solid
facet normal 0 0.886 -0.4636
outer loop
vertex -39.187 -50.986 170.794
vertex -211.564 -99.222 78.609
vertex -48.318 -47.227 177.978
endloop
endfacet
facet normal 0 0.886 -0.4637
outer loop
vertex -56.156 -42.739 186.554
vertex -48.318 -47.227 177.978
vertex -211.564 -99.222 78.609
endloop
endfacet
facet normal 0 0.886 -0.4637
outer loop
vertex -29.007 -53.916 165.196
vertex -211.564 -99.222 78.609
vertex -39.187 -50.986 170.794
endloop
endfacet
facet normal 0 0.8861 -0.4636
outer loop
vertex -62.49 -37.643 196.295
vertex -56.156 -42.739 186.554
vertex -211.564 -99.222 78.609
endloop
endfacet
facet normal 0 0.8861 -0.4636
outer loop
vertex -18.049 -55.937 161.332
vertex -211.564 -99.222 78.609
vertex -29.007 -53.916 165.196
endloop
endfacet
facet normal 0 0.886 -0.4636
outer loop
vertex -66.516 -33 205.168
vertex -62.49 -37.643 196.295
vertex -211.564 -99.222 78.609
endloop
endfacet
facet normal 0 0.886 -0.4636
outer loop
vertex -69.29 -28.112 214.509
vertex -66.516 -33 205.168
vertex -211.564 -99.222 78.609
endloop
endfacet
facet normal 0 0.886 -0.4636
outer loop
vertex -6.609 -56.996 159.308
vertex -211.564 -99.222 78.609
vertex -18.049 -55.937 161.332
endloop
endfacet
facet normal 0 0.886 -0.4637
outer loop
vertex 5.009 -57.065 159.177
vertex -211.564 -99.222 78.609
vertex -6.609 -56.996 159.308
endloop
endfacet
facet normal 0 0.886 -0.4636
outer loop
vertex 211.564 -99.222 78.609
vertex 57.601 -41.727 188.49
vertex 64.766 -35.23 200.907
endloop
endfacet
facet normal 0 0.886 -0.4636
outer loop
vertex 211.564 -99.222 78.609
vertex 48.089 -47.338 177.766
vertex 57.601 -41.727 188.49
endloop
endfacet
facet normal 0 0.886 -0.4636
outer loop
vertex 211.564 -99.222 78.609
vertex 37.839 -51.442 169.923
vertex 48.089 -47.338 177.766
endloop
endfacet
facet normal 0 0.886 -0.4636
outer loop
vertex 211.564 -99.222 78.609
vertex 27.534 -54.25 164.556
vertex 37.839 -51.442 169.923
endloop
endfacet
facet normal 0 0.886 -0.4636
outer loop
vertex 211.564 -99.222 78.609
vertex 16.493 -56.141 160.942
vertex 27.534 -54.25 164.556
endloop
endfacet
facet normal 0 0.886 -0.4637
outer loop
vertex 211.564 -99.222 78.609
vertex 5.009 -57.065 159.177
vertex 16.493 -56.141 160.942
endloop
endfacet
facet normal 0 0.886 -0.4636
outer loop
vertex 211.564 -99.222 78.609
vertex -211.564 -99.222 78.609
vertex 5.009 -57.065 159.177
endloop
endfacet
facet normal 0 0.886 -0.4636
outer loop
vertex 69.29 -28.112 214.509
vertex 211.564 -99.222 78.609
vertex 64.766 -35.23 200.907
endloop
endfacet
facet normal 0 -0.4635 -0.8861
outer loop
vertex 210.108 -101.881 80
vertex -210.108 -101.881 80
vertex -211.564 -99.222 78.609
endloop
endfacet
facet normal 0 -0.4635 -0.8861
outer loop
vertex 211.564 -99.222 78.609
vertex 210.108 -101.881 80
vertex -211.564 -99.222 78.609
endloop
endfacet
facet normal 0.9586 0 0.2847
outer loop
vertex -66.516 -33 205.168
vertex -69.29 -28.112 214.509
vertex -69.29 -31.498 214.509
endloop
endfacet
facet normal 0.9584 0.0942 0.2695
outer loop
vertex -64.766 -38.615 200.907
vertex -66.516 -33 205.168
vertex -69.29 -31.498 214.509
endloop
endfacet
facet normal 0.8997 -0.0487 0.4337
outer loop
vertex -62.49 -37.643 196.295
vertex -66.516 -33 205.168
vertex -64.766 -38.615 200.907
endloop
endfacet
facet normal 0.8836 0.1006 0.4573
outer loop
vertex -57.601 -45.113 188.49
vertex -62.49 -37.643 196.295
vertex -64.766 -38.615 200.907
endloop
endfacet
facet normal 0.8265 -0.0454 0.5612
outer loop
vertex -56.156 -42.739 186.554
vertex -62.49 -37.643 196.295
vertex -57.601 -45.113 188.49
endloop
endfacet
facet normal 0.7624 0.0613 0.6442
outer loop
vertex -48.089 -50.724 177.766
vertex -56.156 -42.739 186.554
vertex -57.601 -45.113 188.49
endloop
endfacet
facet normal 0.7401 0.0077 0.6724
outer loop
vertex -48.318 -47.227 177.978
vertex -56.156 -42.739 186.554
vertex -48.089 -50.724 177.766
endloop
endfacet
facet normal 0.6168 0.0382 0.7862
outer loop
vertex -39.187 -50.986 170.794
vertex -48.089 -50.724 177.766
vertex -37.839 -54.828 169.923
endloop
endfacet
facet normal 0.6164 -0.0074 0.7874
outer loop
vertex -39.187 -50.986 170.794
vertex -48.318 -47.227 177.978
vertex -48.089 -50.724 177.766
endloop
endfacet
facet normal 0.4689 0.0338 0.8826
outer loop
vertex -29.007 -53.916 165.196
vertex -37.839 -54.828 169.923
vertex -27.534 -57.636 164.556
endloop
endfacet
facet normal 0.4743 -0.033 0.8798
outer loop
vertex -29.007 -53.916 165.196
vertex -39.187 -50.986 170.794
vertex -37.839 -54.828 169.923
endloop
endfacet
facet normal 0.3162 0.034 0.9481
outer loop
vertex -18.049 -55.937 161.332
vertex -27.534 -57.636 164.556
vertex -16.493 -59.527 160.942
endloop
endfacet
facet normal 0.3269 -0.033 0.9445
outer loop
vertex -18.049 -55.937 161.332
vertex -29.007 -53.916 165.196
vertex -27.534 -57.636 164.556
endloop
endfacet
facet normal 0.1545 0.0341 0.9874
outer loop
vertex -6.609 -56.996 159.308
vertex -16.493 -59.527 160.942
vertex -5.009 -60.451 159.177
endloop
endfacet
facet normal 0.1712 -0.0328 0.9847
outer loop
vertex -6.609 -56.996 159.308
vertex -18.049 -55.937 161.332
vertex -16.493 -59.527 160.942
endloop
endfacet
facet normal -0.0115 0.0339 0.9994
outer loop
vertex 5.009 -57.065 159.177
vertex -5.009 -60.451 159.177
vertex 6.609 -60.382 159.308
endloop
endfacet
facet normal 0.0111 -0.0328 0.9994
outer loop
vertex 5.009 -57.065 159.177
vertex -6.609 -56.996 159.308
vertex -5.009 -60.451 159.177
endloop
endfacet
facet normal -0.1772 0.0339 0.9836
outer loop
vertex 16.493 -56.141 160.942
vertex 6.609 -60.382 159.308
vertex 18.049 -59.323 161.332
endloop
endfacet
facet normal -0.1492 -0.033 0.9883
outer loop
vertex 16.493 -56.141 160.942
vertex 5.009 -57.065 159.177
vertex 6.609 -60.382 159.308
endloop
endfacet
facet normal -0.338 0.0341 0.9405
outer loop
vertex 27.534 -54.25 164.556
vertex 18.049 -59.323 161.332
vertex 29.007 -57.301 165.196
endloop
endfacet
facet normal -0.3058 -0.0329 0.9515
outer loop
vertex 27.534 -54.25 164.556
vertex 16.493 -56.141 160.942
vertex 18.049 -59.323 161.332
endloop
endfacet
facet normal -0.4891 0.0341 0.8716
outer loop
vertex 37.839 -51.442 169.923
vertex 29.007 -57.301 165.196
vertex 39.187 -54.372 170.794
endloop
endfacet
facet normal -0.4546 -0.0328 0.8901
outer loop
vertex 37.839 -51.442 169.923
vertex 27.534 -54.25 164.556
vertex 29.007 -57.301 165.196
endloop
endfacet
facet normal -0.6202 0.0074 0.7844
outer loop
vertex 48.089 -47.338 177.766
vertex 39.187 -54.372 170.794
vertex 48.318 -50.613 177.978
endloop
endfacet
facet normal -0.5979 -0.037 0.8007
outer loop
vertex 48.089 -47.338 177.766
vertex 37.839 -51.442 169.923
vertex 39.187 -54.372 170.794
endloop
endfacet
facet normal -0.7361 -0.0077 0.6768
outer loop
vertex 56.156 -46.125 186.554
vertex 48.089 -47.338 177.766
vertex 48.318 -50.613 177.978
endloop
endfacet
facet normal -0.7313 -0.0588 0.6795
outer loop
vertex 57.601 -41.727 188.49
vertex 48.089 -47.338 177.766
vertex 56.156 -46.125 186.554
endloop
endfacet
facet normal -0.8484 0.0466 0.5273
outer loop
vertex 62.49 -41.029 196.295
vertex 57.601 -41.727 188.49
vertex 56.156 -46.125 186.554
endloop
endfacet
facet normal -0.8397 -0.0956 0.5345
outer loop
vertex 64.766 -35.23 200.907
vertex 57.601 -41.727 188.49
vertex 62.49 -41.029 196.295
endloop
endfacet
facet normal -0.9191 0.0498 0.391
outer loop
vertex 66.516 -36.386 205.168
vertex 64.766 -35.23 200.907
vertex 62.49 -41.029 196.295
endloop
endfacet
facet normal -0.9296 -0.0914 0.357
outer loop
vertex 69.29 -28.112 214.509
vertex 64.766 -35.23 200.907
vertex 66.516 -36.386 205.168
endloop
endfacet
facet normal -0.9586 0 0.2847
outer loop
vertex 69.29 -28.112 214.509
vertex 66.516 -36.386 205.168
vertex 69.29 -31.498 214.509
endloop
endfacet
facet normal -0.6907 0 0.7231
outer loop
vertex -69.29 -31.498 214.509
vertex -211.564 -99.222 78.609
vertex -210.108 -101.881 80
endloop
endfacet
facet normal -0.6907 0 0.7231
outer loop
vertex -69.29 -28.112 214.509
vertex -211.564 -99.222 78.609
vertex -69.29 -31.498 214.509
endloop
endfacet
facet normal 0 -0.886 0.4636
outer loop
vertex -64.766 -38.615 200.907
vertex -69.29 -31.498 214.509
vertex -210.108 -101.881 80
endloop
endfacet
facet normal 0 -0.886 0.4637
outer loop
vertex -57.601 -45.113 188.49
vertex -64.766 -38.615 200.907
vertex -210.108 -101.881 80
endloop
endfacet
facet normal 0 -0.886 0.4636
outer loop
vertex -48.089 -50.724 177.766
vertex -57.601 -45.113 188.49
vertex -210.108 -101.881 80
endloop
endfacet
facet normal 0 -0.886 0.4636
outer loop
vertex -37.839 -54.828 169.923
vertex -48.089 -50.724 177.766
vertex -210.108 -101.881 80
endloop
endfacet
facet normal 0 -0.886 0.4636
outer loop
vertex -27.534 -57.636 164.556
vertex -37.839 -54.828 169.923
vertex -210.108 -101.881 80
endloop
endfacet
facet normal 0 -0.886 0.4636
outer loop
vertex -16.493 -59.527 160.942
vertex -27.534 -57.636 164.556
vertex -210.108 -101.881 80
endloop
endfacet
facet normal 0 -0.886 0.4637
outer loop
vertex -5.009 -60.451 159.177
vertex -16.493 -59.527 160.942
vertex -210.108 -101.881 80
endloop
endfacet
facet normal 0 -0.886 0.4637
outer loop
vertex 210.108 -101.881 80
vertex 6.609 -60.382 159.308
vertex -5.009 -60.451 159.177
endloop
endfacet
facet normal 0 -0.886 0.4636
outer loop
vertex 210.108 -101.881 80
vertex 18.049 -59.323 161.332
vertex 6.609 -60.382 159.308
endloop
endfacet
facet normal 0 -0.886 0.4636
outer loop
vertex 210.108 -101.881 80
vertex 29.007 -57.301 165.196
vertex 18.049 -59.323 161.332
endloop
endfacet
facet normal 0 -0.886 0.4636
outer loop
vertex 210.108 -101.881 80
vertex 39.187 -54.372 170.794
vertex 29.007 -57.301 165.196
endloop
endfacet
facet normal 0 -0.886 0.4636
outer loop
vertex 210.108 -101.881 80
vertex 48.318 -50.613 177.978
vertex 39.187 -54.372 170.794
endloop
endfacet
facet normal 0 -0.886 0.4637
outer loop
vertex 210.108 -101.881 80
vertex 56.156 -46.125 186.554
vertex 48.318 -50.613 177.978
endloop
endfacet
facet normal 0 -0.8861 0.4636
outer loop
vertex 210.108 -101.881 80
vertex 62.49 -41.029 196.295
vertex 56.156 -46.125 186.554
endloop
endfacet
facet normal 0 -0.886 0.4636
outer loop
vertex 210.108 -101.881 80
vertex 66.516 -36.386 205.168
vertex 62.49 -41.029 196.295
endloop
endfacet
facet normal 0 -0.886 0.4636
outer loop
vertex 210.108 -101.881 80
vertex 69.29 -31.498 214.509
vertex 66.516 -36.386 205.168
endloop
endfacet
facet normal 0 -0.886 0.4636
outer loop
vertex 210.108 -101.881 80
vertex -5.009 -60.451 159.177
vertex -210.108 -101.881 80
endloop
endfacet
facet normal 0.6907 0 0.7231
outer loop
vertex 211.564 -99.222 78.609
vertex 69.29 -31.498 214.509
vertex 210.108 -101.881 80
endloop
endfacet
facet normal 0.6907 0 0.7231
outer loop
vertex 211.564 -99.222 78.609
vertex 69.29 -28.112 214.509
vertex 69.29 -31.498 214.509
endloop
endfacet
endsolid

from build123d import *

# Parameters (mm, degrees)
F1_DEPTH = 282.5
F2_R     = 71
F3_DEPTH = 101.881547
F5_DEPTH = 101.881547


with BuildPart() as f1:
    # F0 (on Right) → F1 (new body, symmetric)
    with BuildSketch(Plane.YZ):
        Polygon((-23.392175, 230), (-101.880547, 80), (-99.222448, 78.609134), (-20.006297, 230), align=None)
    extrude(amount=F1_DEPTH, both=True)

    # F2 (on Front) → F3 (cut, through all)
    with BuildSketch(Plane.XZ):
        with Locations((0, 230)):
            Circle(F2_R)
    extrude(amount=F3_DEPTH, mode=Mode.SUBTRACT)

    # F4 (on Front) → F5 (cut, through all)
    with BuildSketch(Plane.XZ):
        Polygon((408.706428, 306.349989), (69.978568, 306.349989), (69.289558, 306.349989), (69.289558, 271.222025), (69.289558, 214.509451), (275.742, 17.306537), (275.742, 0), (282.5, 0), (408.706428, 0), align=None)
        Polygon((-69.289558, 271.222025), (-69.289558, 306.349989), (-69.978568, 306.349989), (-408.706428, 306.349989), (-408.706428, 0), (-282.5, 0), (-275.742, 0), (-275.742, 17.306537), (-69.289558, 214.509451), align=None)
    extrude(amount=F5_DEPTH, mode=Mode.SUBTRACT)


solid = f1.part
